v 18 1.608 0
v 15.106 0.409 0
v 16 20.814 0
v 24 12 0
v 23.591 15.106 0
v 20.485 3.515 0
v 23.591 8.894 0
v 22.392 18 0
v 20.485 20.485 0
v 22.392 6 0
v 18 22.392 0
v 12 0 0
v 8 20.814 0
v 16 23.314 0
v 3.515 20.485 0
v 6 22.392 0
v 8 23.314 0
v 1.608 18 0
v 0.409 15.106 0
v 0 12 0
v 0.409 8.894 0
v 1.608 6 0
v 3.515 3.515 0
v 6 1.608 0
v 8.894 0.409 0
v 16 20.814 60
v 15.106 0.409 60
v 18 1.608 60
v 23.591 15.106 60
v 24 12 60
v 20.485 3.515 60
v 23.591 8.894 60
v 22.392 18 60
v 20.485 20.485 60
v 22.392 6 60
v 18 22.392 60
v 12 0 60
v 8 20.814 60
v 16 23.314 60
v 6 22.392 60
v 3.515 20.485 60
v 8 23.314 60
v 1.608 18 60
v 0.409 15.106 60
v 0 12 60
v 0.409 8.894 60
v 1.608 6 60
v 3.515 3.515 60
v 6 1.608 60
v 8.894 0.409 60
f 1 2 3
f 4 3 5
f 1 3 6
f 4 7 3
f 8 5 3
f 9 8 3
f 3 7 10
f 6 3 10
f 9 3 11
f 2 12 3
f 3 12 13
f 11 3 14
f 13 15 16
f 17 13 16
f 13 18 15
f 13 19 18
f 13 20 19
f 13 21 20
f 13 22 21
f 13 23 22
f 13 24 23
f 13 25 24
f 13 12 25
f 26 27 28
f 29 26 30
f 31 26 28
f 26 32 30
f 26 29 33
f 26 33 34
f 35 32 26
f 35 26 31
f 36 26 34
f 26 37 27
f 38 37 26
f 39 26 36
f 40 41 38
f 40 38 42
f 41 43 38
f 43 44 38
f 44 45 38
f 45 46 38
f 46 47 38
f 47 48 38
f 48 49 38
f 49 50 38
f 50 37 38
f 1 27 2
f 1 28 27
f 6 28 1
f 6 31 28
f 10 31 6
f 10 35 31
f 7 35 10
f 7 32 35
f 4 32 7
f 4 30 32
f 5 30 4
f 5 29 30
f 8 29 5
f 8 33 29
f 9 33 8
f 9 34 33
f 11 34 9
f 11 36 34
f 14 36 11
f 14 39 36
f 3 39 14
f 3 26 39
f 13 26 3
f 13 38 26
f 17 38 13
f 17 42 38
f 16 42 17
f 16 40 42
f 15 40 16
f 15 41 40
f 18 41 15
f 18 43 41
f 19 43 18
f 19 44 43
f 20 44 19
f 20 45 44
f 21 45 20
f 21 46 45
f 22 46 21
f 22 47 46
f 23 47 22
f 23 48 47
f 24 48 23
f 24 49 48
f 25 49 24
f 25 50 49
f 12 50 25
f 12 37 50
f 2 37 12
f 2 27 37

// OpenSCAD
$fn = 32;

// ----------------------------------------------------------------------
// Keyway shaft: d24 shaft, key 8 x 2.5 mm
// ----------------------------------------------------------------------

// --- parameters (mm) ---
shaft_r = 12;             // shaft radius
key_w = 8;                // keyway width
key_d = 2.5;              // keyway depth below the surface line
plate_t = 60;             // shaft length, Z (extrusion height)

shaft_d = 2 * shaft_r;  // shaft diameter
circle_step = 15;  // polygon sampling step, degrees

profile = [[6, 22.392], [3.515, 20.485], [1.608, 18], [0.409, 15.106], [0, 12], [0.409, 8.894], [1.608, 6], [3.515, 3.515], [6, 1.608], [8.894, 0.409], [12, 0], [15.106, 0.409], [18, 1.608], [20.485, 3.515], [22.392, 6], [23.591, 8.894], [24, 12], [23.591, 15.106], [22.392, 18], [20.485, 20.485], [18, 22.392], [16, 23.314], [16, 20.814], [8, 20.814], [8, 23.314]];  // primary outline, 25 points, counter clockwise

// --- the one profile operation ---
linear_extrude(height = plate_t) polygon(points = profile);
